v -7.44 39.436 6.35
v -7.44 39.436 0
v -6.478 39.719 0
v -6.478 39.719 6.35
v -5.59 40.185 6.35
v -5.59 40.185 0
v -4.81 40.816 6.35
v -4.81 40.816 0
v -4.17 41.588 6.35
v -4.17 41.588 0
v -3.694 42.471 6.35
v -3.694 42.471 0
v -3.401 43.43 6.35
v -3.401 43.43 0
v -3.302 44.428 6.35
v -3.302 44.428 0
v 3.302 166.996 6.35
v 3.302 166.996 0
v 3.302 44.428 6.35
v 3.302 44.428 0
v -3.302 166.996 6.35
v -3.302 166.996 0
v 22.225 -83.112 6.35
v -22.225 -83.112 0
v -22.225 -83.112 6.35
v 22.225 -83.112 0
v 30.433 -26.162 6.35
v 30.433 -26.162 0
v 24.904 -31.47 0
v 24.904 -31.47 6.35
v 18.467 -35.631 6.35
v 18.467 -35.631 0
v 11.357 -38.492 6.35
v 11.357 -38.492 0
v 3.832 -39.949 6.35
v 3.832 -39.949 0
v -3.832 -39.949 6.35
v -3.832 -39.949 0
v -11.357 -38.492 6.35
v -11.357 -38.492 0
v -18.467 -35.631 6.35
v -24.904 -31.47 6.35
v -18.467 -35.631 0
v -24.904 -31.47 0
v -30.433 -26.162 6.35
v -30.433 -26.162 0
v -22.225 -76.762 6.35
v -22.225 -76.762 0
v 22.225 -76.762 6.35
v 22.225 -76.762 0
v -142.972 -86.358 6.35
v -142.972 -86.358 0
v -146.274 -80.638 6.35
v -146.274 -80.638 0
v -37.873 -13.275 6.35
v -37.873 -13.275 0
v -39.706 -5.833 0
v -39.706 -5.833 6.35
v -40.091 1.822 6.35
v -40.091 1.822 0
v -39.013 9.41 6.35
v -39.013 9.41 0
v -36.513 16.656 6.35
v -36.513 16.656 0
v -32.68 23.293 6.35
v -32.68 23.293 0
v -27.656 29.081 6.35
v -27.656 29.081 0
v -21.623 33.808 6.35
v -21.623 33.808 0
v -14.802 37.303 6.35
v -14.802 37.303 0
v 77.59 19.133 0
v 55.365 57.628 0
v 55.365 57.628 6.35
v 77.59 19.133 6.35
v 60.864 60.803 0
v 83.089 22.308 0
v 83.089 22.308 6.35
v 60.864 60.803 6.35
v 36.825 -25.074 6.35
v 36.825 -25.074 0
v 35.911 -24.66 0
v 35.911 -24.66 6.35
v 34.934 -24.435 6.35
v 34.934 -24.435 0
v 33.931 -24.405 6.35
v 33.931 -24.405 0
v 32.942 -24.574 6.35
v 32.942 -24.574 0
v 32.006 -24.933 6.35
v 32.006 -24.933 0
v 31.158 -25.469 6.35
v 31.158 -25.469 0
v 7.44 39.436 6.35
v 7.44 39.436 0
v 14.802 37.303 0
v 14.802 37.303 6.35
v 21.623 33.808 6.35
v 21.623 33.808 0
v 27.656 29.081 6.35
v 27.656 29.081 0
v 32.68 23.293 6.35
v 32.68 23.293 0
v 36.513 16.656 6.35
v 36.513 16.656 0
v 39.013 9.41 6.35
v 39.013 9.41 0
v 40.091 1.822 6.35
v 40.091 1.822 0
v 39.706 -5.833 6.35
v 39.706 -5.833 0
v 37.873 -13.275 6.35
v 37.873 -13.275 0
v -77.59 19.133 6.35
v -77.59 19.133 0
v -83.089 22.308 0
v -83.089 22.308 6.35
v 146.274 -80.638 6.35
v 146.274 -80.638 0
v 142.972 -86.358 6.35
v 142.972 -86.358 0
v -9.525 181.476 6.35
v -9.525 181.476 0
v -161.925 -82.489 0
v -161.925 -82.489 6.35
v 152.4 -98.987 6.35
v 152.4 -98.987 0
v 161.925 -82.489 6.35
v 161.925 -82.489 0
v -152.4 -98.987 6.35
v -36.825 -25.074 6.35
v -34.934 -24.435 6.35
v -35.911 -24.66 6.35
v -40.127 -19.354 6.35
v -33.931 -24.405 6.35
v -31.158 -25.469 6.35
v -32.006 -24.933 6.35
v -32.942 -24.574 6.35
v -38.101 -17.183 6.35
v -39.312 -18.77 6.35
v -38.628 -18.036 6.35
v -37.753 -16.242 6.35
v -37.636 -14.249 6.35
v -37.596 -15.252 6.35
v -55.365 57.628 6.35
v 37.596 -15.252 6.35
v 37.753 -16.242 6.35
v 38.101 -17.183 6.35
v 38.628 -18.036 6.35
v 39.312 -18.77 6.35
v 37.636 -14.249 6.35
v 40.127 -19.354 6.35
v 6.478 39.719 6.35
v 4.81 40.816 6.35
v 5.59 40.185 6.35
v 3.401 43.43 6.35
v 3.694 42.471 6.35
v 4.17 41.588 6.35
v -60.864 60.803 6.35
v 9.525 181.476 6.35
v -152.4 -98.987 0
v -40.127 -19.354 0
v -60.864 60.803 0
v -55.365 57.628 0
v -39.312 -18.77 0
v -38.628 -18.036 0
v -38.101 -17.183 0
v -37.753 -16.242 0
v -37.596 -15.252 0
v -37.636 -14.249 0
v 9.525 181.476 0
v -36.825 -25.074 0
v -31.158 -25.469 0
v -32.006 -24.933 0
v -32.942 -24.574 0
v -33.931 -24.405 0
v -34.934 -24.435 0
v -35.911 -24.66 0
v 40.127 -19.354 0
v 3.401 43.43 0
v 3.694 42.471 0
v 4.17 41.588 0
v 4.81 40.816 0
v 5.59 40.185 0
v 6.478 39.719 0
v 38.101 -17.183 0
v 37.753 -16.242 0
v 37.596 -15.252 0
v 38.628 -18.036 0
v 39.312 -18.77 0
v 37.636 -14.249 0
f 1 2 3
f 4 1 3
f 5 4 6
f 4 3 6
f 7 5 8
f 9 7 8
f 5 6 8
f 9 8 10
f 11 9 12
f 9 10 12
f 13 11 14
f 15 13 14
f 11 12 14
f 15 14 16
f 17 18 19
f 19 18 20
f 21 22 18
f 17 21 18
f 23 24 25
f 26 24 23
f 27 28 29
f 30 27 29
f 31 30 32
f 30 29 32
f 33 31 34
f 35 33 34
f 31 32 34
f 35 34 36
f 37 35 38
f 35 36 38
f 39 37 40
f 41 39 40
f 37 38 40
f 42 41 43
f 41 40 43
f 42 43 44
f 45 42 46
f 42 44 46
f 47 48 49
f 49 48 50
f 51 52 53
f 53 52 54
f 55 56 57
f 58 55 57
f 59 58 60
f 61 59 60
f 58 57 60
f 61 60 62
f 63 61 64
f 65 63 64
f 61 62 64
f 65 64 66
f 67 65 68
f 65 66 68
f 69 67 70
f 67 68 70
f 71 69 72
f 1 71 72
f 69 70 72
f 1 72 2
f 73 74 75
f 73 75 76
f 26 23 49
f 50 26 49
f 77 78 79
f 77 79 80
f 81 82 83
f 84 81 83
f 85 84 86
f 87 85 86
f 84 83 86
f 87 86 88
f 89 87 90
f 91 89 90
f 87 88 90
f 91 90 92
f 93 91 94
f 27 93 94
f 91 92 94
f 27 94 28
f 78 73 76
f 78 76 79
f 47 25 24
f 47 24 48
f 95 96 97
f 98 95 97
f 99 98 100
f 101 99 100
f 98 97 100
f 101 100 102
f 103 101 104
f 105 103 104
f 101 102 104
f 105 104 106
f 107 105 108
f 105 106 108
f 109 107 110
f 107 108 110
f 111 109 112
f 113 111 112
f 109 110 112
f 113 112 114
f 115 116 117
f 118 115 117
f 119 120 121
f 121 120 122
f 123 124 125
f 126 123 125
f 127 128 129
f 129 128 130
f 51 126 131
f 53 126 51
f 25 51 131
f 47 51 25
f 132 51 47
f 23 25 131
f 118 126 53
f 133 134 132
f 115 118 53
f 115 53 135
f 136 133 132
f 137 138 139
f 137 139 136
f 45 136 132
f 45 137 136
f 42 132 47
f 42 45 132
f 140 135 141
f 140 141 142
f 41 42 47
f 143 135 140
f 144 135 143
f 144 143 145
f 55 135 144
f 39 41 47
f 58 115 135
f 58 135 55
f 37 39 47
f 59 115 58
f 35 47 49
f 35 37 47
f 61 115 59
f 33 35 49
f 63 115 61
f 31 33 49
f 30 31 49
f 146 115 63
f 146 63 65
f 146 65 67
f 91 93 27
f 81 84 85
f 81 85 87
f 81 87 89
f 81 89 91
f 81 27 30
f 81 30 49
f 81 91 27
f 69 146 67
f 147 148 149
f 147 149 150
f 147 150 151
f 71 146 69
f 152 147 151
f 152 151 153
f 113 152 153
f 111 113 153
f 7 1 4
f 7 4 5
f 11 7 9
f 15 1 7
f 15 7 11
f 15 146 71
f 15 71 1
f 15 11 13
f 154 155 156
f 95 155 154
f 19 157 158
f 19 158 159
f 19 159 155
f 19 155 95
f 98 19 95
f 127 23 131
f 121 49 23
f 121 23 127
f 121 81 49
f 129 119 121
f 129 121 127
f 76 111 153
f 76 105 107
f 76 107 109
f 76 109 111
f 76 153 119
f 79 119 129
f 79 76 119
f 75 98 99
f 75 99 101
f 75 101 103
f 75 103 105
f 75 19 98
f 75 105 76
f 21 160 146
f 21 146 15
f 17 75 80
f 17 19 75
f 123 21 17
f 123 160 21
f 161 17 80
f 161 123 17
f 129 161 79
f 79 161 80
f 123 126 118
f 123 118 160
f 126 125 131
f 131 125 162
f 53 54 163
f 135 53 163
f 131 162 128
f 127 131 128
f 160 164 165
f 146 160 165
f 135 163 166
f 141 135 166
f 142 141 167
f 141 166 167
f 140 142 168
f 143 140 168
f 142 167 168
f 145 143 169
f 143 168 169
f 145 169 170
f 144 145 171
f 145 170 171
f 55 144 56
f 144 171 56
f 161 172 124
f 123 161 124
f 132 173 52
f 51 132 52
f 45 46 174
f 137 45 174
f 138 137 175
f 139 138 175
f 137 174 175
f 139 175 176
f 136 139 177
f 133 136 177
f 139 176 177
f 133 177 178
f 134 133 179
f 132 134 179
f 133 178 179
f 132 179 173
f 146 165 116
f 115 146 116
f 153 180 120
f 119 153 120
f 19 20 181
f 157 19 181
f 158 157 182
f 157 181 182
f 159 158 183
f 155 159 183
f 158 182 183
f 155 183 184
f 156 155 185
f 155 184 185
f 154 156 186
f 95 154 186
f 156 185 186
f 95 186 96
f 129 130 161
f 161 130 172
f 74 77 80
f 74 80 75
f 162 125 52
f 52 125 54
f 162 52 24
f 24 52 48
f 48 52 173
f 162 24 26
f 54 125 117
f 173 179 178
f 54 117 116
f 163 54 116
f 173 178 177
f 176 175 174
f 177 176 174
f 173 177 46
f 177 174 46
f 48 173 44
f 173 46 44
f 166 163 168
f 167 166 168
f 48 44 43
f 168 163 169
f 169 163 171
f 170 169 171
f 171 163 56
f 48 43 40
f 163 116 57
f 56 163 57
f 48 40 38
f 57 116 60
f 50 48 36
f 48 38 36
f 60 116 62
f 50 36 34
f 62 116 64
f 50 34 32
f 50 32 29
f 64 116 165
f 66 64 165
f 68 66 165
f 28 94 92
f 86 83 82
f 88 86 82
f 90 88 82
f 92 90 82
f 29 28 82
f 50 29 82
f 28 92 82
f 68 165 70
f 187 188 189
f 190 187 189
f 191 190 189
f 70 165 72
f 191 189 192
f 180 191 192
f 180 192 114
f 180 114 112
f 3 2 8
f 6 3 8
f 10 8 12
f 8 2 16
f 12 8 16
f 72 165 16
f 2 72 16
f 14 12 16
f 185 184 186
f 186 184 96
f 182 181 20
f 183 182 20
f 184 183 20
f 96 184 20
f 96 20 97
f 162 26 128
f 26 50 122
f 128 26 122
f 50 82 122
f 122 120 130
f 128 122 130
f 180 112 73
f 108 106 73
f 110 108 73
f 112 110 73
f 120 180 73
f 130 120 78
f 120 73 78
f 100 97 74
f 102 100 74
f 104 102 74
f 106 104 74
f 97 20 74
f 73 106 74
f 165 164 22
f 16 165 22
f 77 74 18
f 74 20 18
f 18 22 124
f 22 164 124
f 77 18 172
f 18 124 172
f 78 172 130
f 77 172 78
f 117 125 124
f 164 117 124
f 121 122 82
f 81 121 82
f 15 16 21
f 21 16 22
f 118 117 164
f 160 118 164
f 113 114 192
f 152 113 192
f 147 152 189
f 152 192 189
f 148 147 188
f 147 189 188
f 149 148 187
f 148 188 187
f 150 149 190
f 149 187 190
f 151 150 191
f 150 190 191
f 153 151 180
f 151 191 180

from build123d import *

# Parameters (mm, degrees)
SKETCH1_W           = 44.45
SKETCH1_H           = 6.35
BOSS_EXTRUDE1_DEPTH = 6.35


with BuildPart() as part:
    # Sketch1 → Boss-Extrude1 (new body)
    with BuildSketch(Plane.XY):
        Polygon((0, -98.986703653), (152.4, -98.986703653), (161.925, -82.48891971), (9.525, 181.475623363), (-9.525, 181.475623363), (-161.925, -82.48891971), (-152.4, -98.986703653), align=None)
        with BuildLine():
            Line((-3.302, 166.995927543), (3.302, 166.995927543))
            Line((3.302, 166.995927543), (3.302, 44.428223237))
            ThreePointArc((3.302, 44.428223237), (4.471070917, 41.186150797), (7.440202247, 39.436288042))
            ThreePointArc((7.440202247, 39.436288042), (34.755331505, 20.066), (37.872928399, -13.274739866))
            ThreePointArc((37.872928399, -13.274739866), (37.903788333, -16.721014402), (40.126969968, -19.354495735))
            Line((40.126969968, -19.354495735), (146.273715581, -80.638347888))
            Line((146.273715581, -80.638347888), (142.971715581, -86.357579655))
            Line((142.971715581, -86.357579655), (36.824969968, -25.073727502))
            ThreePointArc((36.824969968, -25.073727502), (33.432717416, -24.465136395), (30.432726152, -26.161548176))
            ThreePointArc((30.432726152, -26.161548176), (0, -40.132), (-30.432726152, -26.161548176))
            ThreePointArc((-30.432726152, -26.161548176), (-33.432717416, -24.465136395), (-36.824969968, -25.073727502))
            Line((-36.824969968, -25.073727502), (-142.971715581, -86.357579655))
            Line((-142.971715581, -86.357579655), (-146.273715581, -80.638347888))
            Line((-146.273715581, -80.638347888), (-40.126969968, -19.354495735))
            ThreePointArc((-40.126969968, -19.354495735), (-37.903788333, -16.721014402), (-37.872928399, -13.274739866))
            ThreePointArc((-37.872928399, -13.274739866), (-34.755331505, 20.066), (-7.440202247, 39.436288042))
            ThreePointArc((-7.440202247, 39.436288042), (-4.471070917, 41.186150797), (-3.302, 44.428223237))
            Line((-3.302, 44.428223237), (-3.302, 166.995927543))
        make_face(mode=Mode.SUBTRACT)
        with Locations((0, -79.936703653)):
            Rectangle(SKETCH1_W, SKETCH1_H, mode=Mode.SUBTRACT)
        Polygon((-83.089346715, 22.308437227), (-60.864346715, 60.803266425), (-55.365085401, 57.628266425), (-77.590085401, 19.133437227), align=None, mode=Mode.SUBTRACT)
        Polygon((60.864346715, 60.803266425), (55.365085401, 57.628266425), (77.590085401, 19.133437227), (83.089346715, 22.308437227), align=None, mode=Mode.SUBTRACT)
    extrude(amount=BOSS_EXTRUDE1_DEPTH)


solid = part.part
